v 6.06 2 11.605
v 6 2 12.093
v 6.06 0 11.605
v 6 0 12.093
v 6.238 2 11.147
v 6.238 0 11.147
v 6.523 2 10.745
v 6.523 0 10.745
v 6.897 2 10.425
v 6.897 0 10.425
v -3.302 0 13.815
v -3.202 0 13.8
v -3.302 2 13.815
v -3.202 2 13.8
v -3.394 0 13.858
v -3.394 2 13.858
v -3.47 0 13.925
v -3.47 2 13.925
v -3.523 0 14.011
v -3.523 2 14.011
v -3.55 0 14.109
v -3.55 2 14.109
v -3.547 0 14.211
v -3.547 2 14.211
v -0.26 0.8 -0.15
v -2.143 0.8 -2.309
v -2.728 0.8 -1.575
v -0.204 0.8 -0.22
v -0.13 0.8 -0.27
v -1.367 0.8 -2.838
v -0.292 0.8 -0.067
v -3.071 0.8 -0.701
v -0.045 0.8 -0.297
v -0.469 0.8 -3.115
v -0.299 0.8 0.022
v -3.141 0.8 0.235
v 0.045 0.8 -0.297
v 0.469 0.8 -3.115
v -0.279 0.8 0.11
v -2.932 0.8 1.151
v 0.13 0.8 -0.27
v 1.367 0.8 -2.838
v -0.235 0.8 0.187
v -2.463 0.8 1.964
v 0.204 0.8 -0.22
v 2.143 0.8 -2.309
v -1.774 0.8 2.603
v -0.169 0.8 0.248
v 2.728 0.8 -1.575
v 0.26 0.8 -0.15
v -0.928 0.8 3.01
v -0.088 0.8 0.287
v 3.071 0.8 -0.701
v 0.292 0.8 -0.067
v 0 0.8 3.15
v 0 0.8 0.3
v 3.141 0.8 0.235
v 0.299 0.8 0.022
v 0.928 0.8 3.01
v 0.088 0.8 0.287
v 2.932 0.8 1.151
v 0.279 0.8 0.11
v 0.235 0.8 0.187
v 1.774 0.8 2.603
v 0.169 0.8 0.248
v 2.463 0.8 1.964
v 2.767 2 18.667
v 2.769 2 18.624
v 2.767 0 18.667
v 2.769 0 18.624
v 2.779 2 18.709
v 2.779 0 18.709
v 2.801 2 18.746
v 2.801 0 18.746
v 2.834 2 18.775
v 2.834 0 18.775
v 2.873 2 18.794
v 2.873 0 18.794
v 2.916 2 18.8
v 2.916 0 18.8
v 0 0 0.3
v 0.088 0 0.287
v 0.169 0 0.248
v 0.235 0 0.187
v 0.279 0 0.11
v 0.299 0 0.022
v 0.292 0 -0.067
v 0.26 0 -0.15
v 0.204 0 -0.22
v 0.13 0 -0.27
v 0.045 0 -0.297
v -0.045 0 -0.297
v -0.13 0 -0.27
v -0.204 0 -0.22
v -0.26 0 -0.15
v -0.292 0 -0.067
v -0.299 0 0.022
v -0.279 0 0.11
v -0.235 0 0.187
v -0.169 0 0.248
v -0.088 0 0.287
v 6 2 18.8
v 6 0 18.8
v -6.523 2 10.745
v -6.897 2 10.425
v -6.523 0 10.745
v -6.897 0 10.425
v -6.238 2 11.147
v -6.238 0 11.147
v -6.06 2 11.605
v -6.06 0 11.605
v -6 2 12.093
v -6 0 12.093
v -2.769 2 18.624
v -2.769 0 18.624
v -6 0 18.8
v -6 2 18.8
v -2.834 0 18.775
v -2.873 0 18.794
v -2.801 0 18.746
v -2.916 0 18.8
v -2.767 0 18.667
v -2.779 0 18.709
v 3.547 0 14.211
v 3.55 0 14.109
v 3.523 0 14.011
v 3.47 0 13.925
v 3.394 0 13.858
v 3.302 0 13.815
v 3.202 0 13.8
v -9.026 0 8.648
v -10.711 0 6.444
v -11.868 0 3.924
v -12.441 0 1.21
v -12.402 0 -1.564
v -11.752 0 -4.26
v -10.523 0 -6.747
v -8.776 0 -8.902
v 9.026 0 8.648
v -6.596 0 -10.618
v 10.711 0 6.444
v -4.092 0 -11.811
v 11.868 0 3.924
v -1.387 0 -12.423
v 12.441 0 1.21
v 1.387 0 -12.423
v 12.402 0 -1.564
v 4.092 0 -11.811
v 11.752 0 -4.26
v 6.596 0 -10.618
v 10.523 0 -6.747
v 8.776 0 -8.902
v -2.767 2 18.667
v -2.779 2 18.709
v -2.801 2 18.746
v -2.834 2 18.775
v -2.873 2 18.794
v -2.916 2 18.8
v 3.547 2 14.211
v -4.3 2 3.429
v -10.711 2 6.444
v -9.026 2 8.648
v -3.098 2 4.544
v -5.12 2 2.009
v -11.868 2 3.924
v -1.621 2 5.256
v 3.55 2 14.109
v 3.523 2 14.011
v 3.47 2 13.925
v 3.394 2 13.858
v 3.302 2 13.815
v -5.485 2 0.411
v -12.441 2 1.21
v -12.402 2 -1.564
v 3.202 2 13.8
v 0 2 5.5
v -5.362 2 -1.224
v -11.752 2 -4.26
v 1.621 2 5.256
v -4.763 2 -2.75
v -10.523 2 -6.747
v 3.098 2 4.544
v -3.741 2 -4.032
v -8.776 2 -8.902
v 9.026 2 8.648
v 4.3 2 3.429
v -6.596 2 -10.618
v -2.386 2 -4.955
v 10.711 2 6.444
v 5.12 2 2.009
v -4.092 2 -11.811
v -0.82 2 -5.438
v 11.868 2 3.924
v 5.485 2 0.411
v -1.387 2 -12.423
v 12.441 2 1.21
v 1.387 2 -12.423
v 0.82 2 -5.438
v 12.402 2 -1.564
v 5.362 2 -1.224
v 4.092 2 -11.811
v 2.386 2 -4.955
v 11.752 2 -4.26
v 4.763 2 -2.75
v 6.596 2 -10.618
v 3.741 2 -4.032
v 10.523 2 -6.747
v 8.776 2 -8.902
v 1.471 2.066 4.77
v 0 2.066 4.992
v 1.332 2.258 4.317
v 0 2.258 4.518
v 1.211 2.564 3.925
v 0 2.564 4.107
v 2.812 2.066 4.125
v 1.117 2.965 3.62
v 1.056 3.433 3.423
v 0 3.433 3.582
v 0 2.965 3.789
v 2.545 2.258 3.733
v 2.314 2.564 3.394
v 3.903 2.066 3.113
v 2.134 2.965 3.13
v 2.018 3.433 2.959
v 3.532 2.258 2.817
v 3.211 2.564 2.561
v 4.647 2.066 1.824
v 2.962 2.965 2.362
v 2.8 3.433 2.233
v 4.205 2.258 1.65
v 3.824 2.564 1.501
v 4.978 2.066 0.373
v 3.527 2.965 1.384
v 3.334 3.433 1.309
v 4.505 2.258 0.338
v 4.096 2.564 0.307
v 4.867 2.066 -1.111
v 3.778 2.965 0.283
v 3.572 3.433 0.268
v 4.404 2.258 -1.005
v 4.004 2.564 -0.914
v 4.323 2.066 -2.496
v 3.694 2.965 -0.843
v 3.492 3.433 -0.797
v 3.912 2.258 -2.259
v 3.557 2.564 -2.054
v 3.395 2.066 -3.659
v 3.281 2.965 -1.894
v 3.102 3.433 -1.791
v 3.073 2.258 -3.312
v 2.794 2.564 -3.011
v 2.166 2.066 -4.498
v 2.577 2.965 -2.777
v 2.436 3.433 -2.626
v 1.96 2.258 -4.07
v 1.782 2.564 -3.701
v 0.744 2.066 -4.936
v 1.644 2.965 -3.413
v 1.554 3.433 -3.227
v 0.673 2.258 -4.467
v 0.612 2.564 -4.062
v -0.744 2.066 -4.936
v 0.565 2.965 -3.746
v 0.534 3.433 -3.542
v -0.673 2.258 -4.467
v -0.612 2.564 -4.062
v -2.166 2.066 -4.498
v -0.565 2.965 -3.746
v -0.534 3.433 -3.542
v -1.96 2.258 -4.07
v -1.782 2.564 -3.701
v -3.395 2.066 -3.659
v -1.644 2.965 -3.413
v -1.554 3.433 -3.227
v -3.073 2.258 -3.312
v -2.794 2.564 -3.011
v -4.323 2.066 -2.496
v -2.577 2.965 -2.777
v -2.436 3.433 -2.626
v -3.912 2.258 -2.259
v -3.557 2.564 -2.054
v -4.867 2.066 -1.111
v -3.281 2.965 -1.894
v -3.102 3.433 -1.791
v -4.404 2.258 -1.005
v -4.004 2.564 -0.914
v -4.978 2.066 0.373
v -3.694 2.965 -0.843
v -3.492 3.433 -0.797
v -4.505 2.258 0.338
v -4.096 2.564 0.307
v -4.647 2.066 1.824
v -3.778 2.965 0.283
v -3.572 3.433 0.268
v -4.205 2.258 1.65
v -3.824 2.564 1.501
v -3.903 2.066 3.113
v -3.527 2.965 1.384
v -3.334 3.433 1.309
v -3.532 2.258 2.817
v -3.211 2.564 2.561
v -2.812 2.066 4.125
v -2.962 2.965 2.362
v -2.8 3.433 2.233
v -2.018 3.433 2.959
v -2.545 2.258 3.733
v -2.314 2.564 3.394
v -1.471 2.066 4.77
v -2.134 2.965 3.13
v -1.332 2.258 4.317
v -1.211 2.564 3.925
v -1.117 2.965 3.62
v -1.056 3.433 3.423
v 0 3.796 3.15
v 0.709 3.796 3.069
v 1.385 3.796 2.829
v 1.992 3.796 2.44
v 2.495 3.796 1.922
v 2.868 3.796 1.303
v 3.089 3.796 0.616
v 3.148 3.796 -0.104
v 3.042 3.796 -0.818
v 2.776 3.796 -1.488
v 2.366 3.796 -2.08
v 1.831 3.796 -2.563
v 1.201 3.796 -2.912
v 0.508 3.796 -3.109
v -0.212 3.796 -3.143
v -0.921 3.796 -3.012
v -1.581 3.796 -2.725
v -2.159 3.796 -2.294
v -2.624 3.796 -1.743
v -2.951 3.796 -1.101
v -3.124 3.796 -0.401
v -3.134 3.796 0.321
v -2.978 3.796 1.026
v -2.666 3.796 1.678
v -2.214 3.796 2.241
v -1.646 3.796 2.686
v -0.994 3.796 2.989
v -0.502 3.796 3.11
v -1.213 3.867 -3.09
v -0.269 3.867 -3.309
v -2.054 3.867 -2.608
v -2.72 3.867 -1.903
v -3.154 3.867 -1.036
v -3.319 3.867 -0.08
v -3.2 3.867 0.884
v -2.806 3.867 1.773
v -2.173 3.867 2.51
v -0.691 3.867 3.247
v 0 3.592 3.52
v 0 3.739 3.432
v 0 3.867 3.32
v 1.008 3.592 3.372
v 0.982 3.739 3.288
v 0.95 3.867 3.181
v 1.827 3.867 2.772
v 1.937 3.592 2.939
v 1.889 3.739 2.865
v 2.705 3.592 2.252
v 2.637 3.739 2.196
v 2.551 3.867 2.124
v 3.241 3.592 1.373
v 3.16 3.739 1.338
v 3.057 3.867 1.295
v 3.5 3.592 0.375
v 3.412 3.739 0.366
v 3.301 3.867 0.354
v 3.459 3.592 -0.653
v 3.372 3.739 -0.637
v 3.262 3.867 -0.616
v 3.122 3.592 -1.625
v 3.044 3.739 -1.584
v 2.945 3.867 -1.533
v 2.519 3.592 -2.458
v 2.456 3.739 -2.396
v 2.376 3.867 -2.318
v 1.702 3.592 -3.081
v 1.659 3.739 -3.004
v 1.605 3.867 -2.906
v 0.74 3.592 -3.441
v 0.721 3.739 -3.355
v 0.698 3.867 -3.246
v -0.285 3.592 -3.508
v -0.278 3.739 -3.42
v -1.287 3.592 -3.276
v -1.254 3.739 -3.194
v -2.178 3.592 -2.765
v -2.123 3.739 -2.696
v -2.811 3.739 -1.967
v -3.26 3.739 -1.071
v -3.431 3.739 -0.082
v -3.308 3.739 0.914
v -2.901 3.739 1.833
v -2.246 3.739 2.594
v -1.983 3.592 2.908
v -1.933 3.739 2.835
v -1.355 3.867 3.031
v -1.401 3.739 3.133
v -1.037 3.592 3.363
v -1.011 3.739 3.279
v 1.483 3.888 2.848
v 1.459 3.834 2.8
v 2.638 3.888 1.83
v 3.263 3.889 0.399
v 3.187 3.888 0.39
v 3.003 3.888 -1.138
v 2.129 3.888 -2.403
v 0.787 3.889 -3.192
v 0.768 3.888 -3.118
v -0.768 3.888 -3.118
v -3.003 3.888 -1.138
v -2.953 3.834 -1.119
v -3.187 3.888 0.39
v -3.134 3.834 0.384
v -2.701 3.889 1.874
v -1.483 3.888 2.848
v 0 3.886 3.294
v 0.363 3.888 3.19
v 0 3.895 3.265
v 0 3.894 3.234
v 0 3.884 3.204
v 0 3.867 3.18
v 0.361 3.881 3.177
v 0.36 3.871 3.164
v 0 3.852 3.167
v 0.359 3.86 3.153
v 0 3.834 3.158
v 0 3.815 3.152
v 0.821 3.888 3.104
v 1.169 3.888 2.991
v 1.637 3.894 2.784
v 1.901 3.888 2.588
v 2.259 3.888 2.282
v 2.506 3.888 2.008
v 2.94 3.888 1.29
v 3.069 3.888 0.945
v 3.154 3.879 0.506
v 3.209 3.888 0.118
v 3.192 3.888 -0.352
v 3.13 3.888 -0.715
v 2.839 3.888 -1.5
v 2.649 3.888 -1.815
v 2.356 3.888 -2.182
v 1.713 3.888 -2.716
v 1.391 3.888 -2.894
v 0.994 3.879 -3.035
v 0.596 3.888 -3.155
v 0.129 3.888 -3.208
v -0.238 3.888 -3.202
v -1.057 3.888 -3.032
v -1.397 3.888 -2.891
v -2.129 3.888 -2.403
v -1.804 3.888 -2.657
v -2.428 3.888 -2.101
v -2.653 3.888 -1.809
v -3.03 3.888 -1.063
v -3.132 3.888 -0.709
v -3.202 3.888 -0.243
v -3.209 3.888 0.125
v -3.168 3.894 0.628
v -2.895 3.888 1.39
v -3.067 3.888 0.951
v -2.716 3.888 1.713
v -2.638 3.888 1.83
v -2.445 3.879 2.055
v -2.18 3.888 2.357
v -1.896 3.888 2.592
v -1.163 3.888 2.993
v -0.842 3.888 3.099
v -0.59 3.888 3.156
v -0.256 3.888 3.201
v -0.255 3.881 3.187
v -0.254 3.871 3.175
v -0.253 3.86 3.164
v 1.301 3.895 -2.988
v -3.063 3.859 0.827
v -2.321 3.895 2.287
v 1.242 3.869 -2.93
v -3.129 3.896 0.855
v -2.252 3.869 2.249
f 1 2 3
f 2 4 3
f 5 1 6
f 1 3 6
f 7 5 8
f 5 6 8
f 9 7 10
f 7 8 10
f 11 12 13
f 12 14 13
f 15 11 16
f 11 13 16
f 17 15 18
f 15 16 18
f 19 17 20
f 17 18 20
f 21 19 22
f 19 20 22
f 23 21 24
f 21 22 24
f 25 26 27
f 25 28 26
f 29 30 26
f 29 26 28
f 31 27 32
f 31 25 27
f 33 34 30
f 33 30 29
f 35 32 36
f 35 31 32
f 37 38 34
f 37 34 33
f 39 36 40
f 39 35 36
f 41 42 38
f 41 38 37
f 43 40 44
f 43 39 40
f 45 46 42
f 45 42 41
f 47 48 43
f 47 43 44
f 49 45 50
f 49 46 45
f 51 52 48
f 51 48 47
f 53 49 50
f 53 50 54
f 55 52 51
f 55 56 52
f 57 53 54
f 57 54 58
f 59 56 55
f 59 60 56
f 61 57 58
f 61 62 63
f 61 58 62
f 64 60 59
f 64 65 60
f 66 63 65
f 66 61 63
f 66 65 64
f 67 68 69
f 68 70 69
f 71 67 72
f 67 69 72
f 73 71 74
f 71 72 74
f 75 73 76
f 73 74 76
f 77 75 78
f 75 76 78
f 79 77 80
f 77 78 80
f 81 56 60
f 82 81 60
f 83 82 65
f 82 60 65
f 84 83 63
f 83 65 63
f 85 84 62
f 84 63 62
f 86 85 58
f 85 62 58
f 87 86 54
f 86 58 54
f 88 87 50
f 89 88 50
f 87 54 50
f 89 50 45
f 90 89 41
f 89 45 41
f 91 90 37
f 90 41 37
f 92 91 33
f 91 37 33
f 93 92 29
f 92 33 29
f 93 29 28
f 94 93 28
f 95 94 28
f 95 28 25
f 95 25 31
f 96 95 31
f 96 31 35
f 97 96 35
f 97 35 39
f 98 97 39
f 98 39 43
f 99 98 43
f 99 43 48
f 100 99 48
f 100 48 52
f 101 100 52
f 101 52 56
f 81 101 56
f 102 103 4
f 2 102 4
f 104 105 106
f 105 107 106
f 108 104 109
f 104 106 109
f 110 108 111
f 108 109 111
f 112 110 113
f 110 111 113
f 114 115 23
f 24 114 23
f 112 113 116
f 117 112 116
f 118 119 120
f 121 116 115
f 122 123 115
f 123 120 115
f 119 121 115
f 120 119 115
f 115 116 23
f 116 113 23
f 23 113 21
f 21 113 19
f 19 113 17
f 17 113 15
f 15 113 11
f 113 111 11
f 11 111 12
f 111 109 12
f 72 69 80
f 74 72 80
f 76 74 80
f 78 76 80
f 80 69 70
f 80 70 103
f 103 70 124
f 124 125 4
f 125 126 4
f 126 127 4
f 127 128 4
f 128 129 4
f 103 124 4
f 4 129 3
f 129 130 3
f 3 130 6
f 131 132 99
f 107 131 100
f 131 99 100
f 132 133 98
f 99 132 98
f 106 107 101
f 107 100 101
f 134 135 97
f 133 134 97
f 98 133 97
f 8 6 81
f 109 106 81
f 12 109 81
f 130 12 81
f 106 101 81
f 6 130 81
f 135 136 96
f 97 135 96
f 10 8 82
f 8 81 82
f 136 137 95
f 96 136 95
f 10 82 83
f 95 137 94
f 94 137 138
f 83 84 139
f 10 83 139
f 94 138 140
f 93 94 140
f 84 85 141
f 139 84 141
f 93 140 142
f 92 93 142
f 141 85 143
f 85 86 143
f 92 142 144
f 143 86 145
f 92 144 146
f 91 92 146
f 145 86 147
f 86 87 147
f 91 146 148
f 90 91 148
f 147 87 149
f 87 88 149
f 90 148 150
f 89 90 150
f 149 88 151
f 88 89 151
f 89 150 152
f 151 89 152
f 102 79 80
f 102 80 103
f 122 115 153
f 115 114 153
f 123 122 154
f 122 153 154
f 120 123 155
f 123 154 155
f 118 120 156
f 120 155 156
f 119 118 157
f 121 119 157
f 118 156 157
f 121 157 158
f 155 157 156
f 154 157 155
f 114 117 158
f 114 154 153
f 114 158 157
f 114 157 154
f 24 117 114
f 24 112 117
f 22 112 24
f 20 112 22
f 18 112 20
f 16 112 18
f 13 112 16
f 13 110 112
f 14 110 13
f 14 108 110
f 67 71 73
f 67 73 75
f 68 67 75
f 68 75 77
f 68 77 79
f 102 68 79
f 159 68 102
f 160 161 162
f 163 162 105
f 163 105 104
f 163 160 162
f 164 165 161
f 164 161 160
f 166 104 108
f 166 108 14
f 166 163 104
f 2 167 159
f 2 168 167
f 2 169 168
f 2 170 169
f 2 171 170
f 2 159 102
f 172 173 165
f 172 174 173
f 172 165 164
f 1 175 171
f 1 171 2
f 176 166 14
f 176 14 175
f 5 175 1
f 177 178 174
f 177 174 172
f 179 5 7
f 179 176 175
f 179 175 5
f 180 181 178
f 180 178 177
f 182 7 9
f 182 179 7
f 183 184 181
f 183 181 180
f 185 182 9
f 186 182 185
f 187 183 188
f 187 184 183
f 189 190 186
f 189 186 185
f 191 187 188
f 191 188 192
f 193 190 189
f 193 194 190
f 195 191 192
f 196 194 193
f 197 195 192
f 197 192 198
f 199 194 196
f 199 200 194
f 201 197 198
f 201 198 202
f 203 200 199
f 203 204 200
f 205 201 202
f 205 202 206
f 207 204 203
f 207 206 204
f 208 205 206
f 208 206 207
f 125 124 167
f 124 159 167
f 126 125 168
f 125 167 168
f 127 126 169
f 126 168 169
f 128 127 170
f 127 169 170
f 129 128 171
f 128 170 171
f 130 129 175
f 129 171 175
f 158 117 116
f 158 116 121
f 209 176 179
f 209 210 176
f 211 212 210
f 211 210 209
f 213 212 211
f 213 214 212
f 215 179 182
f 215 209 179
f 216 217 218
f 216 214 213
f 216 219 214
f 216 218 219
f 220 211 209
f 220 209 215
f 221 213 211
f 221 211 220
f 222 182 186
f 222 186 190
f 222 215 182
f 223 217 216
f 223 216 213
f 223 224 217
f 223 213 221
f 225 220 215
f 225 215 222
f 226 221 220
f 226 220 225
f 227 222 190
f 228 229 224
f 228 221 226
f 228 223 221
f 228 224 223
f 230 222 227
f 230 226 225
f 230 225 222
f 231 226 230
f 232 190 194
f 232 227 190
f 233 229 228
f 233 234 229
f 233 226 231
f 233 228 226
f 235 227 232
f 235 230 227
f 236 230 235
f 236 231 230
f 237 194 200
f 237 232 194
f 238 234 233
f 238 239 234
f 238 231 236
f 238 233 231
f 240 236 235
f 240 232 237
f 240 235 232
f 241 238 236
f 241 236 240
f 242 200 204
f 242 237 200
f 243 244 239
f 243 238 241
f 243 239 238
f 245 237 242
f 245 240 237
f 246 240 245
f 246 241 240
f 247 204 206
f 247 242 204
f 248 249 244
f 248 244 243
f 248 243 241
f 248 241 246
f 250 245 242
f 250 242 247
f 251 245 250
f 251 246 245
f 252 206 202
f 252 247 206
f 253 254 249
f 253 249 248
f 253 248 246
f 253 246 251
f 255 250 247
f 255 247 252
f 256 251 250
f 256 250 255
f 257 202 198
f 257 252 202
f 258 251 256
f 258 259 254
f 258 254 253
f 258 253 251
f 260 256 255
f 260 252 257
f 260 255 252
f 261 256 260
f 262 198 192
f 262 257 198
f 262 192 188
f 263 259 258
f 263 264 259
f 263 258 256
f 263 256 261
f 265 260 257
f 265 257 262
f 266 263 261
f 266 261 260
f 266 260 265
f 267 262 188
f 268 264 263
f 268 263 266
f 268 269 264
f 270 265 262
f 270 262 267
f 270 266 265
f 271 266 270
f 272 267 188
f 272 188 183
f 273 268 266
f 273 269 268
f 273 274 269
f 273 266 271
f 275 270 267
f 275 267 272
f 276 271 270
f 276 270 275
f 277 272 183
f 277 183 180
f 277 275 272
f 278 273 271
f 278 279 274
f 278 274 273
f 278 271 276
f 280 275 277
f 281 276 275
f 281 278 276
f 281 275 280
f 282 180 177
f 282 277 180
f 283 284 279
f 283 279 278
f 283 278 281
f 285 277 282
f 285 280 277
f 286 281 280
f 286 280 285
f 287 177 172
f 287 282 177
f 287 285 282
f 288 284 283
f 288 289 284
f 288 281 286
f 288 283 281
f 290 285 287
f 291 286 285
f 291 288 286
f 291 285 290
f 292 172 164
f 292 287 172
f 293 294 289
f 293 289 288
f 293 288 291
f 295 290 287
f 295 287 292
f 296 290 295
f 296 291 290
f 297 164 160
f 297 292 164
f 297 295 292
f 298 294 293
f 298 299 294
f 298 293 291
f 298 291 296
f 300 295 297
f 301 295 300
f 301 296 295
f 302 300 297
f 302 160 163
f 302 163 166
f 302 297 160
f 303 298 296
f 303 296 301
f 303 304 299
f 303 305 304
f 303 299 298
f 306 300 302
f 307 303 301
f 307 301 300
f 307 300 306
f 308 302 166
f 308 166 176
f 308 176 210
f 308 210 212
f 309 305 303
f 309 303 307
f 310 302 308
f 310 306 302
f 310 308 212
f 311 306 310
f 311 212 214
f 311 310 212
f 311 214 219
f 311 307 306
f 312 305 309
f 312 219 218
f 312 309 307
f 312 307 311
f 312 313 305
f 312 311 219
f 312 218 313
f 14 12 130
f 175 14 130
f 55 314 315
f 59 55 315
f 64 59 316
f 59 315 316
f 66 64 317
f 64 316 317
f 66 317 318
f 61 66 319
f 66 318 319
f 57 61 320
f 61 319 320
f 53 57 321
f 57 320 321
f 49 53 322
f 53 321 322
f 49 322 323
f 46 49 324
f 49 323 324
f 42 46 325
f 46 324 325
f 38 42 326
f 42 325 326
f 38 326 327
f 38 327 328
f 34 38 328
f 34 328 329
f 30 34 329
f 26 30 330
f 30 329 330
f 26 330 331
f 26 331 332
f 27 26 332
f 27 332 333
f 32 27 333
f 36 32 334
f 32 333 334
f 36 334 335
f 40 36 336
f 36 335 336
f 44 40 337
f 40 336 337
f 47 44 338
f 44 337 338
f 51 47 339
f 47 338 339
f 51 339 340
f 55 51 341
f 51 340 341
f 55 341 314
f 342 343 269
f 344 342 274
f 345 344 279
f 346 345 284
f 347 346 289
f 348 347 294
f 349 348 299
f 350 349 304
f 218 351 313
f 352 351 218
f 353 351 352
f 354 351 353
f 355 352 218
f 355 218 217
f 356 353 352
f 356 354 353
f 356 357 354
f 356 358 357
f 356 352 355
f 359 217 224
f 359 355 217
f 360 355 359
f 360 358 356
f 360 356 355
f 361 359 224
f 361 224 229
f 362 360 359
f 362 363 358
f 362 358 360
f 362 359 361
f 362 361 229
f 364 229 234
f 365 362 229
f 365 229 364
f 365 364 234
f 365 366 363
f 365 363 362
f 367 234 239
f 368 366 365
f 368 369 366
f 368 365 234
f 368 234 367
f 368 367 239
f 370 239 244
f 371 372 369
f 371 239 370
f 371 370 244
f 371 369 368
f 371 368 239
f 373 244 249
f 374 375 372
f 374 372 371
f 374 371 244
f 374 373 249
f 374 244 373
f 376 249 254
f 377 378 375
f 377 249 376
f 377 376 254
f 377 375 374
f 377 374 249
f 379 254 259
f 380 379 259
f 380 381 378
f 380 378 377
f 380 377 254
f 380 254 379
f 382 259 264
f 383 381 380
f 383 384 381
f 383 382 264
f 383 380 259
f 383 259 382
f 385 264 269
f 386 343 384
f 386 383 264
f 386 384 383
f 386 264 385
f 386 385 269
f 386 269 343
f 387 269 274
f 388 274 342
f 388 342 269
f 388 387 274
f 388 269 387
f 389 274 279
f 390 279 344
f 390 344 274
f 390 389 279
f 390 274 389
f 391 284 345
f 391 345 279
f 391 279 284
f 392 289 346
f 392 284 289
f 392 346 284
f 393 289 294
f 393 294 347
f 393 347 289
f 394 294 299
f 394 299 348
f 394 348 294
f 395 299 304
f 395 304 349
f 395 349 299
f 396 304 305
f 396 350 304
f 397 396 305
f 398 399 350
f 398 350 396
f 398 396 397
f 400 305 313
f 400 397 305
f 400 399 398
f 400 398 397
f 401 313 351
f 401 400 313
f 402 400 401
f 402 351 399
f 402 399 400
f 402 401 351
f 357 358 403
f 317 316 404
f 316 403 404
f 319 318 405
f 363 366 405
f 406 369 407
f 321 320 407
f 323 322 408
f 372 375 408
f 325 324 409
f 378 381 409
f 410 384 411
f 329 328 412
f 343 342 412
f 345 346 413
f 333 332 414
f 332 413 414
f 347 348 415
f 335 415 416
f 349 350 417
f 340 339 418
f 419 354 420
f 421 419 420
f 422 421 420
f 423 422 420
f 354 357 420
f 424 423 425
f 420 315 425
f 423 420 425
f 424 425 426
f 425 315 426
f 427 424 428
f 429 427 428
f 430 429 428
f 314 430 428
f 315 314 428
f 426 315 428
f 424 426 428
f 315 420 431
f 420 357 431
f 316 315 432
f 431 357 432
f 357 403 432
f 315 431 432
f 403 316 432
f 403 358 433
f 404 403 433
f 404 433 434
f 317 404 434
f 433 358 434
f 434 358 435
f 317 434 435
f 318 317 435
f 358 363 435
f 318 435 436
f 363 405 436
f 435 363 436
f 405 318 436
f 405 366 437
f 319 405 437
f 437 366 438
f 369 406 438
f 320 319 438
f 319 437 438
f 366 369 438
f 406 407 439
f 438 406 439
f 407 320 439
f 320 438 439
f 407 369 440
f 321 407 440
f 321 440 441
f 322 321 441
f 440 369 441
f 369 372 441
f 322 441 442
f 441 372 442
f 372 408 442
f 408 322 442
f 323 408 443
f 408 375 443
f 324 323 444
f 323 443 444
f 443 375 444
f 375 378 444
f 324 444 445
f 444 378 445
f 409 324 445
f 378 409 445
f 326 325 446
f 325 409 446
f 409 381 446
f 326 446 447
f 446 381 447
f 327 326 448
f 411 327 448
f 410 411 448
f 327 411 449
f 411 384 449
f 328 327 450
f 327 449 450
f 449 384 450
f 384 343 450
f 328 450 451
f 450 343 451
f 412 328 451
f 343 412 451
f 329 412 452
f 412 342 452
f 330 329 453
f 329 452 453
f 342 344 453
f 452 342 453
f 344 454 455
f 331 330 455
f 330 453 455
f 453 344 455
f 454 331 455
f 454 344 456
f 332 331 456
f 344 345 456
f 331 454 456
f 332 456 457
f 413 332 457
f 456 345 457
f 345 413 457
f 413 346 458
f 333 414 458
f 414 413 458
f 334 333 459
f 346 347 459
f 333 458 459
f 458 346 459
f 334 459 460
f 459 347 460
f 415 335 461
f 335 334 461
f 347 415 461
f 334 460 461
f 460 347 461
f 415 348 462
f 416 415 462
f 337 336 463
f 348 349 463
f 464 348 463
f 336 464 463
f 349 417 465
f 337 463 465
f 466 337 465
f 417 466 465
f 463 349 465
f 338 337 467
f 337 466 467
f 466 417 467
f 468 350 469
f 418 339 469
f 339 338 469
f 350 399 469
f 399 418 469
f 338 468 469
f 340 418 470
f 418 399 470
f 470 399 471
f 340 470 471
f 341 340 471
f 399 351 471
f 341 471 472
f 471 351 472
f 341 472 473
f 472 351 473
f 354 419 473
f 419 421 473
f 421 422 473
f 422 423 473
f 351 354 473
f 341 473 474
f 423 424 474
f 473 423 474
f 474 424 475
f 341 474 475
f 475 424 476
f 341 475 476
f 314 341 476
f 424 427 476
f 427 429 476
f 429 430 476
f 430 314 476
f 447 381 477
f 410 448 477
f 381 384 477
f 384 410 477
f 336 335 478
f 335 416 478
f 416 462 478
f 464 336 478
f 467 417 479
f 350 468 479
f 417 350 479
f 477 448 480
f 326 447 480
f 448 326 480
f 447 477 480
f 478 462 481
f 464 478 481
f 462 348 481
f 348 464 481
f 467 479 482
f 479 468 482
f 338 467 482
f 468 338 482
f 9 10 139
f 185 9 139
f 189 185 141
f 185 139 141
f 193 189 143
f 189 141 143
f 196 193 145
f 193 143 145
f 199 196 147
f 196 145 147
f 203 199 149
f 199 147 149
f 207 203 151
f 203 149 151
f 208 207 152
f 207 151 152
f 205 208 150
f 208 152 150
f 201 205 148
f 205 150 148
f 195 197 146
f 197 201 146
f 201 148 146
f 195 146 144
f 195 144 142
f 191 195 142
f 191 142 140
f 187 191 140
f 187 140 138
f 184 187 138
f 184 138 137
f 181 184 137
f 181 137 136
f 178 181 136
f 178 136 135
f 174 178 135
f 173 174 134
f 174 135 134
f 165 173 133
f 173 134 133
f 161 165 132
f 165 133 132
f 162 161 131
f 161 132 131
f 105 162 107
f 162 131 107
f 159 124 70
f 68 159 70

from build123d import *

# Parameters (mm, degrees)
BOSS_EXTRUDE1_DEPTH = 2
SKETCH2_R           = 12.5
SKETCH2_R_2         = 3
BOSS_EXTRUDE2_DEPTH = 2
SKETCH4_W           = 12
SKETCH4_H           = 0.2
CUT_EXTRUDE1_DEPTH  = 4
FILLET3_R           = 0.35
FILLET4_R           = 0.15
FILLET6_R           = 2
SKETCH6_R           = 3.5
BOSS_EXTRUDE5_DEPTH = 2
SKETCH7_R           = 3.15
CUT_EXTRUDE3_DEPTH  = 3.2
FILLET7_R           = 2
FILLET8_R           = 1
FILLET9_R           = 0.1
SKETCH8_R           = 0.3
CUT_EXTRUDE4_DEPTH  = 23.787574965


# Some blends are built 0.0001 mm under size
with BuildPart() as part:
    # Sketch1 → Boss-Extrude1 (new body)
    with BuildSketch(Plane(origin=(0, 0, 0), x_dir=(1, 0, 0), z_dir=(0, 1, 0))):
        Polygon((-6, 6), (-6, -13.291502622), (-6, -19), (-2.70227506, -19), (-3.619175359, -13.8), (0, -13.8), (3.619175359, -13.8), (2.70227506, -19), (6, -19), (6, -13.291502622), (6, 6), align=None)
    extrude(amount=BOSS_EXTRUDE1_DEPTH)

    # Sketch2 → Boss-Extrude2 (add)
    with BuildSketch(Plane(origin=(0, 0, 0), x_dir=(1, 0, 0), z_dir=(0, 1, 0))):
        Circle(SKETCH2_R)
        Circle(SKETCH2_R_2, mode=Mode.SUBTRACT)
    extrude(amount=BOSS_EXTRUDE2_DEPTH)

    # Sketch4 → Cut-Extrude1 (cut)
    with BuildSketch(Plane(origin=(0, 2, 0), x_dir=(1, 0, 0), z_dir=(0, 1, 0))):
        with Locations((0, -18.9)):
            Rectangle(SKETCH4_W, SKETCH4_H)
    extrude(amount=-CUT_EXTRUDE1_DEPTH, mode=Mode.SUBTRACT)

    # Fillet3
    fillet3_edges = [part.edges().sort_by_distance(p)[0] for p in [
        (3.619175359, 1, 13.8),
        (-3.619175359, 1, 13.8),
    ]]
    fillet(fillet3_edges, radius=FILLET3_R)

    # Fillet4
    fillet4_edges = [part.edges().sort_by_distance(p)[0] for p in [
        (2.737540456, 1, 18.8),
        (-2.737540456, 1, 18.8),
    ]]
    fillet(fillet4_edges, radius=FILLET4_R)

    # Fillet6
    fillet6_edges = [part.edges().sort_by_distance(p)[0] for p in [
        (-6, 1, 10.9658561),
        (6, 1, 10.9658561),
    ]]
    fillet(fillet6_edges, radius=FILLET6_R)

    # Sketch6 → Boss-Extrude5 (add)
    with BuildSketch(Plane(origin=(0, 2, 0), x_dir=(1, 0, 0), z_dir=(0, 1, 0))):
        with Locations(Location((0, 0, 0), (0, 0, 270))):
            Circle(SKETCH6_R)
    extrude(amount=BOSS_EXTRUDE5_DEPTH)

    # Sketch7 → Cut-Extrude3 (cut)
    with BuildSketch(Plane(origin=(0, 4, 0), x_dir=(1, 0, 0), z_dir=(0, 1, 0))):
        with Locations(Location((0, 0, 0), (0, 0, 270))):
            Circle(SKETCH7_R)
    extrude(amount=-CUT_EXTRUDE3_DEPTH, mode=Mode.SUBTRACT)

    # Fillet7
    fillet7_edges = [part.edges().sort_by_distance(p)[0] for p in [
        (0, 2, -3.5),
    ]]
    fillet(fillet7_edges, radius=FILLET7_R - 0.0001)  # a hair under: the kernel refuses the full size

    # Fillet8
    # the kernel refuses this fillet: 1 mm, written as the material it takes off along each edge
    with BuildSketch(Plane(origin=(0, 4, 0), x_dir=(0, 0, 1), z_dir=(-1, 0, 0))) as fillet8_piece_1:
        with BuildLine():
            CenterArc((2.62284141, -0.849766921), FILLET8_R, 16.453180618, 41.733146886)
            Line((3.15, 0), (3.202715859, 0.084976692))
            ThreePointArc((3.202715859, 0.084976692), (3.325, 0.1), (3.5, 0.1))
            Line((3.5, 0.1), (3.6, 0))
            ThreePointArc((3.6, 0), (3.6, -0.0001), (3.677798058, -0.538211998))
            Line((3.677798058, -0.538211998), (3.581892908, -0.566535173))
        make_face()
    revolve(axis=Axis((0, 4, 0), (0, 1, 0)), mode=Mode.SUBTRACT)

    # Fillet9
    fillet9_edges = [part.edges().sort_by_distance(p)[0] for p in [
        (0, 4, -3.15),
    ]]
    fillet(fillet9_edges, radius=FILLET9_R)

    # Sketch8 → Cut-Extrude4 (cut, through all)
    with BuildSketch(Plane(origin=(0, 0.8, 0), x_dir=(1, 0, 0), z_dir=(0, 1, 0))):
        with Locations(Location((0, 0, 0), (0, 0, 270))):
            Circle(SKETCH8_R)
    extrude(amount=-CUT_EXTRUDE4_DEPTH, mode=Mode.SUBTRACT)


solid = part.part
